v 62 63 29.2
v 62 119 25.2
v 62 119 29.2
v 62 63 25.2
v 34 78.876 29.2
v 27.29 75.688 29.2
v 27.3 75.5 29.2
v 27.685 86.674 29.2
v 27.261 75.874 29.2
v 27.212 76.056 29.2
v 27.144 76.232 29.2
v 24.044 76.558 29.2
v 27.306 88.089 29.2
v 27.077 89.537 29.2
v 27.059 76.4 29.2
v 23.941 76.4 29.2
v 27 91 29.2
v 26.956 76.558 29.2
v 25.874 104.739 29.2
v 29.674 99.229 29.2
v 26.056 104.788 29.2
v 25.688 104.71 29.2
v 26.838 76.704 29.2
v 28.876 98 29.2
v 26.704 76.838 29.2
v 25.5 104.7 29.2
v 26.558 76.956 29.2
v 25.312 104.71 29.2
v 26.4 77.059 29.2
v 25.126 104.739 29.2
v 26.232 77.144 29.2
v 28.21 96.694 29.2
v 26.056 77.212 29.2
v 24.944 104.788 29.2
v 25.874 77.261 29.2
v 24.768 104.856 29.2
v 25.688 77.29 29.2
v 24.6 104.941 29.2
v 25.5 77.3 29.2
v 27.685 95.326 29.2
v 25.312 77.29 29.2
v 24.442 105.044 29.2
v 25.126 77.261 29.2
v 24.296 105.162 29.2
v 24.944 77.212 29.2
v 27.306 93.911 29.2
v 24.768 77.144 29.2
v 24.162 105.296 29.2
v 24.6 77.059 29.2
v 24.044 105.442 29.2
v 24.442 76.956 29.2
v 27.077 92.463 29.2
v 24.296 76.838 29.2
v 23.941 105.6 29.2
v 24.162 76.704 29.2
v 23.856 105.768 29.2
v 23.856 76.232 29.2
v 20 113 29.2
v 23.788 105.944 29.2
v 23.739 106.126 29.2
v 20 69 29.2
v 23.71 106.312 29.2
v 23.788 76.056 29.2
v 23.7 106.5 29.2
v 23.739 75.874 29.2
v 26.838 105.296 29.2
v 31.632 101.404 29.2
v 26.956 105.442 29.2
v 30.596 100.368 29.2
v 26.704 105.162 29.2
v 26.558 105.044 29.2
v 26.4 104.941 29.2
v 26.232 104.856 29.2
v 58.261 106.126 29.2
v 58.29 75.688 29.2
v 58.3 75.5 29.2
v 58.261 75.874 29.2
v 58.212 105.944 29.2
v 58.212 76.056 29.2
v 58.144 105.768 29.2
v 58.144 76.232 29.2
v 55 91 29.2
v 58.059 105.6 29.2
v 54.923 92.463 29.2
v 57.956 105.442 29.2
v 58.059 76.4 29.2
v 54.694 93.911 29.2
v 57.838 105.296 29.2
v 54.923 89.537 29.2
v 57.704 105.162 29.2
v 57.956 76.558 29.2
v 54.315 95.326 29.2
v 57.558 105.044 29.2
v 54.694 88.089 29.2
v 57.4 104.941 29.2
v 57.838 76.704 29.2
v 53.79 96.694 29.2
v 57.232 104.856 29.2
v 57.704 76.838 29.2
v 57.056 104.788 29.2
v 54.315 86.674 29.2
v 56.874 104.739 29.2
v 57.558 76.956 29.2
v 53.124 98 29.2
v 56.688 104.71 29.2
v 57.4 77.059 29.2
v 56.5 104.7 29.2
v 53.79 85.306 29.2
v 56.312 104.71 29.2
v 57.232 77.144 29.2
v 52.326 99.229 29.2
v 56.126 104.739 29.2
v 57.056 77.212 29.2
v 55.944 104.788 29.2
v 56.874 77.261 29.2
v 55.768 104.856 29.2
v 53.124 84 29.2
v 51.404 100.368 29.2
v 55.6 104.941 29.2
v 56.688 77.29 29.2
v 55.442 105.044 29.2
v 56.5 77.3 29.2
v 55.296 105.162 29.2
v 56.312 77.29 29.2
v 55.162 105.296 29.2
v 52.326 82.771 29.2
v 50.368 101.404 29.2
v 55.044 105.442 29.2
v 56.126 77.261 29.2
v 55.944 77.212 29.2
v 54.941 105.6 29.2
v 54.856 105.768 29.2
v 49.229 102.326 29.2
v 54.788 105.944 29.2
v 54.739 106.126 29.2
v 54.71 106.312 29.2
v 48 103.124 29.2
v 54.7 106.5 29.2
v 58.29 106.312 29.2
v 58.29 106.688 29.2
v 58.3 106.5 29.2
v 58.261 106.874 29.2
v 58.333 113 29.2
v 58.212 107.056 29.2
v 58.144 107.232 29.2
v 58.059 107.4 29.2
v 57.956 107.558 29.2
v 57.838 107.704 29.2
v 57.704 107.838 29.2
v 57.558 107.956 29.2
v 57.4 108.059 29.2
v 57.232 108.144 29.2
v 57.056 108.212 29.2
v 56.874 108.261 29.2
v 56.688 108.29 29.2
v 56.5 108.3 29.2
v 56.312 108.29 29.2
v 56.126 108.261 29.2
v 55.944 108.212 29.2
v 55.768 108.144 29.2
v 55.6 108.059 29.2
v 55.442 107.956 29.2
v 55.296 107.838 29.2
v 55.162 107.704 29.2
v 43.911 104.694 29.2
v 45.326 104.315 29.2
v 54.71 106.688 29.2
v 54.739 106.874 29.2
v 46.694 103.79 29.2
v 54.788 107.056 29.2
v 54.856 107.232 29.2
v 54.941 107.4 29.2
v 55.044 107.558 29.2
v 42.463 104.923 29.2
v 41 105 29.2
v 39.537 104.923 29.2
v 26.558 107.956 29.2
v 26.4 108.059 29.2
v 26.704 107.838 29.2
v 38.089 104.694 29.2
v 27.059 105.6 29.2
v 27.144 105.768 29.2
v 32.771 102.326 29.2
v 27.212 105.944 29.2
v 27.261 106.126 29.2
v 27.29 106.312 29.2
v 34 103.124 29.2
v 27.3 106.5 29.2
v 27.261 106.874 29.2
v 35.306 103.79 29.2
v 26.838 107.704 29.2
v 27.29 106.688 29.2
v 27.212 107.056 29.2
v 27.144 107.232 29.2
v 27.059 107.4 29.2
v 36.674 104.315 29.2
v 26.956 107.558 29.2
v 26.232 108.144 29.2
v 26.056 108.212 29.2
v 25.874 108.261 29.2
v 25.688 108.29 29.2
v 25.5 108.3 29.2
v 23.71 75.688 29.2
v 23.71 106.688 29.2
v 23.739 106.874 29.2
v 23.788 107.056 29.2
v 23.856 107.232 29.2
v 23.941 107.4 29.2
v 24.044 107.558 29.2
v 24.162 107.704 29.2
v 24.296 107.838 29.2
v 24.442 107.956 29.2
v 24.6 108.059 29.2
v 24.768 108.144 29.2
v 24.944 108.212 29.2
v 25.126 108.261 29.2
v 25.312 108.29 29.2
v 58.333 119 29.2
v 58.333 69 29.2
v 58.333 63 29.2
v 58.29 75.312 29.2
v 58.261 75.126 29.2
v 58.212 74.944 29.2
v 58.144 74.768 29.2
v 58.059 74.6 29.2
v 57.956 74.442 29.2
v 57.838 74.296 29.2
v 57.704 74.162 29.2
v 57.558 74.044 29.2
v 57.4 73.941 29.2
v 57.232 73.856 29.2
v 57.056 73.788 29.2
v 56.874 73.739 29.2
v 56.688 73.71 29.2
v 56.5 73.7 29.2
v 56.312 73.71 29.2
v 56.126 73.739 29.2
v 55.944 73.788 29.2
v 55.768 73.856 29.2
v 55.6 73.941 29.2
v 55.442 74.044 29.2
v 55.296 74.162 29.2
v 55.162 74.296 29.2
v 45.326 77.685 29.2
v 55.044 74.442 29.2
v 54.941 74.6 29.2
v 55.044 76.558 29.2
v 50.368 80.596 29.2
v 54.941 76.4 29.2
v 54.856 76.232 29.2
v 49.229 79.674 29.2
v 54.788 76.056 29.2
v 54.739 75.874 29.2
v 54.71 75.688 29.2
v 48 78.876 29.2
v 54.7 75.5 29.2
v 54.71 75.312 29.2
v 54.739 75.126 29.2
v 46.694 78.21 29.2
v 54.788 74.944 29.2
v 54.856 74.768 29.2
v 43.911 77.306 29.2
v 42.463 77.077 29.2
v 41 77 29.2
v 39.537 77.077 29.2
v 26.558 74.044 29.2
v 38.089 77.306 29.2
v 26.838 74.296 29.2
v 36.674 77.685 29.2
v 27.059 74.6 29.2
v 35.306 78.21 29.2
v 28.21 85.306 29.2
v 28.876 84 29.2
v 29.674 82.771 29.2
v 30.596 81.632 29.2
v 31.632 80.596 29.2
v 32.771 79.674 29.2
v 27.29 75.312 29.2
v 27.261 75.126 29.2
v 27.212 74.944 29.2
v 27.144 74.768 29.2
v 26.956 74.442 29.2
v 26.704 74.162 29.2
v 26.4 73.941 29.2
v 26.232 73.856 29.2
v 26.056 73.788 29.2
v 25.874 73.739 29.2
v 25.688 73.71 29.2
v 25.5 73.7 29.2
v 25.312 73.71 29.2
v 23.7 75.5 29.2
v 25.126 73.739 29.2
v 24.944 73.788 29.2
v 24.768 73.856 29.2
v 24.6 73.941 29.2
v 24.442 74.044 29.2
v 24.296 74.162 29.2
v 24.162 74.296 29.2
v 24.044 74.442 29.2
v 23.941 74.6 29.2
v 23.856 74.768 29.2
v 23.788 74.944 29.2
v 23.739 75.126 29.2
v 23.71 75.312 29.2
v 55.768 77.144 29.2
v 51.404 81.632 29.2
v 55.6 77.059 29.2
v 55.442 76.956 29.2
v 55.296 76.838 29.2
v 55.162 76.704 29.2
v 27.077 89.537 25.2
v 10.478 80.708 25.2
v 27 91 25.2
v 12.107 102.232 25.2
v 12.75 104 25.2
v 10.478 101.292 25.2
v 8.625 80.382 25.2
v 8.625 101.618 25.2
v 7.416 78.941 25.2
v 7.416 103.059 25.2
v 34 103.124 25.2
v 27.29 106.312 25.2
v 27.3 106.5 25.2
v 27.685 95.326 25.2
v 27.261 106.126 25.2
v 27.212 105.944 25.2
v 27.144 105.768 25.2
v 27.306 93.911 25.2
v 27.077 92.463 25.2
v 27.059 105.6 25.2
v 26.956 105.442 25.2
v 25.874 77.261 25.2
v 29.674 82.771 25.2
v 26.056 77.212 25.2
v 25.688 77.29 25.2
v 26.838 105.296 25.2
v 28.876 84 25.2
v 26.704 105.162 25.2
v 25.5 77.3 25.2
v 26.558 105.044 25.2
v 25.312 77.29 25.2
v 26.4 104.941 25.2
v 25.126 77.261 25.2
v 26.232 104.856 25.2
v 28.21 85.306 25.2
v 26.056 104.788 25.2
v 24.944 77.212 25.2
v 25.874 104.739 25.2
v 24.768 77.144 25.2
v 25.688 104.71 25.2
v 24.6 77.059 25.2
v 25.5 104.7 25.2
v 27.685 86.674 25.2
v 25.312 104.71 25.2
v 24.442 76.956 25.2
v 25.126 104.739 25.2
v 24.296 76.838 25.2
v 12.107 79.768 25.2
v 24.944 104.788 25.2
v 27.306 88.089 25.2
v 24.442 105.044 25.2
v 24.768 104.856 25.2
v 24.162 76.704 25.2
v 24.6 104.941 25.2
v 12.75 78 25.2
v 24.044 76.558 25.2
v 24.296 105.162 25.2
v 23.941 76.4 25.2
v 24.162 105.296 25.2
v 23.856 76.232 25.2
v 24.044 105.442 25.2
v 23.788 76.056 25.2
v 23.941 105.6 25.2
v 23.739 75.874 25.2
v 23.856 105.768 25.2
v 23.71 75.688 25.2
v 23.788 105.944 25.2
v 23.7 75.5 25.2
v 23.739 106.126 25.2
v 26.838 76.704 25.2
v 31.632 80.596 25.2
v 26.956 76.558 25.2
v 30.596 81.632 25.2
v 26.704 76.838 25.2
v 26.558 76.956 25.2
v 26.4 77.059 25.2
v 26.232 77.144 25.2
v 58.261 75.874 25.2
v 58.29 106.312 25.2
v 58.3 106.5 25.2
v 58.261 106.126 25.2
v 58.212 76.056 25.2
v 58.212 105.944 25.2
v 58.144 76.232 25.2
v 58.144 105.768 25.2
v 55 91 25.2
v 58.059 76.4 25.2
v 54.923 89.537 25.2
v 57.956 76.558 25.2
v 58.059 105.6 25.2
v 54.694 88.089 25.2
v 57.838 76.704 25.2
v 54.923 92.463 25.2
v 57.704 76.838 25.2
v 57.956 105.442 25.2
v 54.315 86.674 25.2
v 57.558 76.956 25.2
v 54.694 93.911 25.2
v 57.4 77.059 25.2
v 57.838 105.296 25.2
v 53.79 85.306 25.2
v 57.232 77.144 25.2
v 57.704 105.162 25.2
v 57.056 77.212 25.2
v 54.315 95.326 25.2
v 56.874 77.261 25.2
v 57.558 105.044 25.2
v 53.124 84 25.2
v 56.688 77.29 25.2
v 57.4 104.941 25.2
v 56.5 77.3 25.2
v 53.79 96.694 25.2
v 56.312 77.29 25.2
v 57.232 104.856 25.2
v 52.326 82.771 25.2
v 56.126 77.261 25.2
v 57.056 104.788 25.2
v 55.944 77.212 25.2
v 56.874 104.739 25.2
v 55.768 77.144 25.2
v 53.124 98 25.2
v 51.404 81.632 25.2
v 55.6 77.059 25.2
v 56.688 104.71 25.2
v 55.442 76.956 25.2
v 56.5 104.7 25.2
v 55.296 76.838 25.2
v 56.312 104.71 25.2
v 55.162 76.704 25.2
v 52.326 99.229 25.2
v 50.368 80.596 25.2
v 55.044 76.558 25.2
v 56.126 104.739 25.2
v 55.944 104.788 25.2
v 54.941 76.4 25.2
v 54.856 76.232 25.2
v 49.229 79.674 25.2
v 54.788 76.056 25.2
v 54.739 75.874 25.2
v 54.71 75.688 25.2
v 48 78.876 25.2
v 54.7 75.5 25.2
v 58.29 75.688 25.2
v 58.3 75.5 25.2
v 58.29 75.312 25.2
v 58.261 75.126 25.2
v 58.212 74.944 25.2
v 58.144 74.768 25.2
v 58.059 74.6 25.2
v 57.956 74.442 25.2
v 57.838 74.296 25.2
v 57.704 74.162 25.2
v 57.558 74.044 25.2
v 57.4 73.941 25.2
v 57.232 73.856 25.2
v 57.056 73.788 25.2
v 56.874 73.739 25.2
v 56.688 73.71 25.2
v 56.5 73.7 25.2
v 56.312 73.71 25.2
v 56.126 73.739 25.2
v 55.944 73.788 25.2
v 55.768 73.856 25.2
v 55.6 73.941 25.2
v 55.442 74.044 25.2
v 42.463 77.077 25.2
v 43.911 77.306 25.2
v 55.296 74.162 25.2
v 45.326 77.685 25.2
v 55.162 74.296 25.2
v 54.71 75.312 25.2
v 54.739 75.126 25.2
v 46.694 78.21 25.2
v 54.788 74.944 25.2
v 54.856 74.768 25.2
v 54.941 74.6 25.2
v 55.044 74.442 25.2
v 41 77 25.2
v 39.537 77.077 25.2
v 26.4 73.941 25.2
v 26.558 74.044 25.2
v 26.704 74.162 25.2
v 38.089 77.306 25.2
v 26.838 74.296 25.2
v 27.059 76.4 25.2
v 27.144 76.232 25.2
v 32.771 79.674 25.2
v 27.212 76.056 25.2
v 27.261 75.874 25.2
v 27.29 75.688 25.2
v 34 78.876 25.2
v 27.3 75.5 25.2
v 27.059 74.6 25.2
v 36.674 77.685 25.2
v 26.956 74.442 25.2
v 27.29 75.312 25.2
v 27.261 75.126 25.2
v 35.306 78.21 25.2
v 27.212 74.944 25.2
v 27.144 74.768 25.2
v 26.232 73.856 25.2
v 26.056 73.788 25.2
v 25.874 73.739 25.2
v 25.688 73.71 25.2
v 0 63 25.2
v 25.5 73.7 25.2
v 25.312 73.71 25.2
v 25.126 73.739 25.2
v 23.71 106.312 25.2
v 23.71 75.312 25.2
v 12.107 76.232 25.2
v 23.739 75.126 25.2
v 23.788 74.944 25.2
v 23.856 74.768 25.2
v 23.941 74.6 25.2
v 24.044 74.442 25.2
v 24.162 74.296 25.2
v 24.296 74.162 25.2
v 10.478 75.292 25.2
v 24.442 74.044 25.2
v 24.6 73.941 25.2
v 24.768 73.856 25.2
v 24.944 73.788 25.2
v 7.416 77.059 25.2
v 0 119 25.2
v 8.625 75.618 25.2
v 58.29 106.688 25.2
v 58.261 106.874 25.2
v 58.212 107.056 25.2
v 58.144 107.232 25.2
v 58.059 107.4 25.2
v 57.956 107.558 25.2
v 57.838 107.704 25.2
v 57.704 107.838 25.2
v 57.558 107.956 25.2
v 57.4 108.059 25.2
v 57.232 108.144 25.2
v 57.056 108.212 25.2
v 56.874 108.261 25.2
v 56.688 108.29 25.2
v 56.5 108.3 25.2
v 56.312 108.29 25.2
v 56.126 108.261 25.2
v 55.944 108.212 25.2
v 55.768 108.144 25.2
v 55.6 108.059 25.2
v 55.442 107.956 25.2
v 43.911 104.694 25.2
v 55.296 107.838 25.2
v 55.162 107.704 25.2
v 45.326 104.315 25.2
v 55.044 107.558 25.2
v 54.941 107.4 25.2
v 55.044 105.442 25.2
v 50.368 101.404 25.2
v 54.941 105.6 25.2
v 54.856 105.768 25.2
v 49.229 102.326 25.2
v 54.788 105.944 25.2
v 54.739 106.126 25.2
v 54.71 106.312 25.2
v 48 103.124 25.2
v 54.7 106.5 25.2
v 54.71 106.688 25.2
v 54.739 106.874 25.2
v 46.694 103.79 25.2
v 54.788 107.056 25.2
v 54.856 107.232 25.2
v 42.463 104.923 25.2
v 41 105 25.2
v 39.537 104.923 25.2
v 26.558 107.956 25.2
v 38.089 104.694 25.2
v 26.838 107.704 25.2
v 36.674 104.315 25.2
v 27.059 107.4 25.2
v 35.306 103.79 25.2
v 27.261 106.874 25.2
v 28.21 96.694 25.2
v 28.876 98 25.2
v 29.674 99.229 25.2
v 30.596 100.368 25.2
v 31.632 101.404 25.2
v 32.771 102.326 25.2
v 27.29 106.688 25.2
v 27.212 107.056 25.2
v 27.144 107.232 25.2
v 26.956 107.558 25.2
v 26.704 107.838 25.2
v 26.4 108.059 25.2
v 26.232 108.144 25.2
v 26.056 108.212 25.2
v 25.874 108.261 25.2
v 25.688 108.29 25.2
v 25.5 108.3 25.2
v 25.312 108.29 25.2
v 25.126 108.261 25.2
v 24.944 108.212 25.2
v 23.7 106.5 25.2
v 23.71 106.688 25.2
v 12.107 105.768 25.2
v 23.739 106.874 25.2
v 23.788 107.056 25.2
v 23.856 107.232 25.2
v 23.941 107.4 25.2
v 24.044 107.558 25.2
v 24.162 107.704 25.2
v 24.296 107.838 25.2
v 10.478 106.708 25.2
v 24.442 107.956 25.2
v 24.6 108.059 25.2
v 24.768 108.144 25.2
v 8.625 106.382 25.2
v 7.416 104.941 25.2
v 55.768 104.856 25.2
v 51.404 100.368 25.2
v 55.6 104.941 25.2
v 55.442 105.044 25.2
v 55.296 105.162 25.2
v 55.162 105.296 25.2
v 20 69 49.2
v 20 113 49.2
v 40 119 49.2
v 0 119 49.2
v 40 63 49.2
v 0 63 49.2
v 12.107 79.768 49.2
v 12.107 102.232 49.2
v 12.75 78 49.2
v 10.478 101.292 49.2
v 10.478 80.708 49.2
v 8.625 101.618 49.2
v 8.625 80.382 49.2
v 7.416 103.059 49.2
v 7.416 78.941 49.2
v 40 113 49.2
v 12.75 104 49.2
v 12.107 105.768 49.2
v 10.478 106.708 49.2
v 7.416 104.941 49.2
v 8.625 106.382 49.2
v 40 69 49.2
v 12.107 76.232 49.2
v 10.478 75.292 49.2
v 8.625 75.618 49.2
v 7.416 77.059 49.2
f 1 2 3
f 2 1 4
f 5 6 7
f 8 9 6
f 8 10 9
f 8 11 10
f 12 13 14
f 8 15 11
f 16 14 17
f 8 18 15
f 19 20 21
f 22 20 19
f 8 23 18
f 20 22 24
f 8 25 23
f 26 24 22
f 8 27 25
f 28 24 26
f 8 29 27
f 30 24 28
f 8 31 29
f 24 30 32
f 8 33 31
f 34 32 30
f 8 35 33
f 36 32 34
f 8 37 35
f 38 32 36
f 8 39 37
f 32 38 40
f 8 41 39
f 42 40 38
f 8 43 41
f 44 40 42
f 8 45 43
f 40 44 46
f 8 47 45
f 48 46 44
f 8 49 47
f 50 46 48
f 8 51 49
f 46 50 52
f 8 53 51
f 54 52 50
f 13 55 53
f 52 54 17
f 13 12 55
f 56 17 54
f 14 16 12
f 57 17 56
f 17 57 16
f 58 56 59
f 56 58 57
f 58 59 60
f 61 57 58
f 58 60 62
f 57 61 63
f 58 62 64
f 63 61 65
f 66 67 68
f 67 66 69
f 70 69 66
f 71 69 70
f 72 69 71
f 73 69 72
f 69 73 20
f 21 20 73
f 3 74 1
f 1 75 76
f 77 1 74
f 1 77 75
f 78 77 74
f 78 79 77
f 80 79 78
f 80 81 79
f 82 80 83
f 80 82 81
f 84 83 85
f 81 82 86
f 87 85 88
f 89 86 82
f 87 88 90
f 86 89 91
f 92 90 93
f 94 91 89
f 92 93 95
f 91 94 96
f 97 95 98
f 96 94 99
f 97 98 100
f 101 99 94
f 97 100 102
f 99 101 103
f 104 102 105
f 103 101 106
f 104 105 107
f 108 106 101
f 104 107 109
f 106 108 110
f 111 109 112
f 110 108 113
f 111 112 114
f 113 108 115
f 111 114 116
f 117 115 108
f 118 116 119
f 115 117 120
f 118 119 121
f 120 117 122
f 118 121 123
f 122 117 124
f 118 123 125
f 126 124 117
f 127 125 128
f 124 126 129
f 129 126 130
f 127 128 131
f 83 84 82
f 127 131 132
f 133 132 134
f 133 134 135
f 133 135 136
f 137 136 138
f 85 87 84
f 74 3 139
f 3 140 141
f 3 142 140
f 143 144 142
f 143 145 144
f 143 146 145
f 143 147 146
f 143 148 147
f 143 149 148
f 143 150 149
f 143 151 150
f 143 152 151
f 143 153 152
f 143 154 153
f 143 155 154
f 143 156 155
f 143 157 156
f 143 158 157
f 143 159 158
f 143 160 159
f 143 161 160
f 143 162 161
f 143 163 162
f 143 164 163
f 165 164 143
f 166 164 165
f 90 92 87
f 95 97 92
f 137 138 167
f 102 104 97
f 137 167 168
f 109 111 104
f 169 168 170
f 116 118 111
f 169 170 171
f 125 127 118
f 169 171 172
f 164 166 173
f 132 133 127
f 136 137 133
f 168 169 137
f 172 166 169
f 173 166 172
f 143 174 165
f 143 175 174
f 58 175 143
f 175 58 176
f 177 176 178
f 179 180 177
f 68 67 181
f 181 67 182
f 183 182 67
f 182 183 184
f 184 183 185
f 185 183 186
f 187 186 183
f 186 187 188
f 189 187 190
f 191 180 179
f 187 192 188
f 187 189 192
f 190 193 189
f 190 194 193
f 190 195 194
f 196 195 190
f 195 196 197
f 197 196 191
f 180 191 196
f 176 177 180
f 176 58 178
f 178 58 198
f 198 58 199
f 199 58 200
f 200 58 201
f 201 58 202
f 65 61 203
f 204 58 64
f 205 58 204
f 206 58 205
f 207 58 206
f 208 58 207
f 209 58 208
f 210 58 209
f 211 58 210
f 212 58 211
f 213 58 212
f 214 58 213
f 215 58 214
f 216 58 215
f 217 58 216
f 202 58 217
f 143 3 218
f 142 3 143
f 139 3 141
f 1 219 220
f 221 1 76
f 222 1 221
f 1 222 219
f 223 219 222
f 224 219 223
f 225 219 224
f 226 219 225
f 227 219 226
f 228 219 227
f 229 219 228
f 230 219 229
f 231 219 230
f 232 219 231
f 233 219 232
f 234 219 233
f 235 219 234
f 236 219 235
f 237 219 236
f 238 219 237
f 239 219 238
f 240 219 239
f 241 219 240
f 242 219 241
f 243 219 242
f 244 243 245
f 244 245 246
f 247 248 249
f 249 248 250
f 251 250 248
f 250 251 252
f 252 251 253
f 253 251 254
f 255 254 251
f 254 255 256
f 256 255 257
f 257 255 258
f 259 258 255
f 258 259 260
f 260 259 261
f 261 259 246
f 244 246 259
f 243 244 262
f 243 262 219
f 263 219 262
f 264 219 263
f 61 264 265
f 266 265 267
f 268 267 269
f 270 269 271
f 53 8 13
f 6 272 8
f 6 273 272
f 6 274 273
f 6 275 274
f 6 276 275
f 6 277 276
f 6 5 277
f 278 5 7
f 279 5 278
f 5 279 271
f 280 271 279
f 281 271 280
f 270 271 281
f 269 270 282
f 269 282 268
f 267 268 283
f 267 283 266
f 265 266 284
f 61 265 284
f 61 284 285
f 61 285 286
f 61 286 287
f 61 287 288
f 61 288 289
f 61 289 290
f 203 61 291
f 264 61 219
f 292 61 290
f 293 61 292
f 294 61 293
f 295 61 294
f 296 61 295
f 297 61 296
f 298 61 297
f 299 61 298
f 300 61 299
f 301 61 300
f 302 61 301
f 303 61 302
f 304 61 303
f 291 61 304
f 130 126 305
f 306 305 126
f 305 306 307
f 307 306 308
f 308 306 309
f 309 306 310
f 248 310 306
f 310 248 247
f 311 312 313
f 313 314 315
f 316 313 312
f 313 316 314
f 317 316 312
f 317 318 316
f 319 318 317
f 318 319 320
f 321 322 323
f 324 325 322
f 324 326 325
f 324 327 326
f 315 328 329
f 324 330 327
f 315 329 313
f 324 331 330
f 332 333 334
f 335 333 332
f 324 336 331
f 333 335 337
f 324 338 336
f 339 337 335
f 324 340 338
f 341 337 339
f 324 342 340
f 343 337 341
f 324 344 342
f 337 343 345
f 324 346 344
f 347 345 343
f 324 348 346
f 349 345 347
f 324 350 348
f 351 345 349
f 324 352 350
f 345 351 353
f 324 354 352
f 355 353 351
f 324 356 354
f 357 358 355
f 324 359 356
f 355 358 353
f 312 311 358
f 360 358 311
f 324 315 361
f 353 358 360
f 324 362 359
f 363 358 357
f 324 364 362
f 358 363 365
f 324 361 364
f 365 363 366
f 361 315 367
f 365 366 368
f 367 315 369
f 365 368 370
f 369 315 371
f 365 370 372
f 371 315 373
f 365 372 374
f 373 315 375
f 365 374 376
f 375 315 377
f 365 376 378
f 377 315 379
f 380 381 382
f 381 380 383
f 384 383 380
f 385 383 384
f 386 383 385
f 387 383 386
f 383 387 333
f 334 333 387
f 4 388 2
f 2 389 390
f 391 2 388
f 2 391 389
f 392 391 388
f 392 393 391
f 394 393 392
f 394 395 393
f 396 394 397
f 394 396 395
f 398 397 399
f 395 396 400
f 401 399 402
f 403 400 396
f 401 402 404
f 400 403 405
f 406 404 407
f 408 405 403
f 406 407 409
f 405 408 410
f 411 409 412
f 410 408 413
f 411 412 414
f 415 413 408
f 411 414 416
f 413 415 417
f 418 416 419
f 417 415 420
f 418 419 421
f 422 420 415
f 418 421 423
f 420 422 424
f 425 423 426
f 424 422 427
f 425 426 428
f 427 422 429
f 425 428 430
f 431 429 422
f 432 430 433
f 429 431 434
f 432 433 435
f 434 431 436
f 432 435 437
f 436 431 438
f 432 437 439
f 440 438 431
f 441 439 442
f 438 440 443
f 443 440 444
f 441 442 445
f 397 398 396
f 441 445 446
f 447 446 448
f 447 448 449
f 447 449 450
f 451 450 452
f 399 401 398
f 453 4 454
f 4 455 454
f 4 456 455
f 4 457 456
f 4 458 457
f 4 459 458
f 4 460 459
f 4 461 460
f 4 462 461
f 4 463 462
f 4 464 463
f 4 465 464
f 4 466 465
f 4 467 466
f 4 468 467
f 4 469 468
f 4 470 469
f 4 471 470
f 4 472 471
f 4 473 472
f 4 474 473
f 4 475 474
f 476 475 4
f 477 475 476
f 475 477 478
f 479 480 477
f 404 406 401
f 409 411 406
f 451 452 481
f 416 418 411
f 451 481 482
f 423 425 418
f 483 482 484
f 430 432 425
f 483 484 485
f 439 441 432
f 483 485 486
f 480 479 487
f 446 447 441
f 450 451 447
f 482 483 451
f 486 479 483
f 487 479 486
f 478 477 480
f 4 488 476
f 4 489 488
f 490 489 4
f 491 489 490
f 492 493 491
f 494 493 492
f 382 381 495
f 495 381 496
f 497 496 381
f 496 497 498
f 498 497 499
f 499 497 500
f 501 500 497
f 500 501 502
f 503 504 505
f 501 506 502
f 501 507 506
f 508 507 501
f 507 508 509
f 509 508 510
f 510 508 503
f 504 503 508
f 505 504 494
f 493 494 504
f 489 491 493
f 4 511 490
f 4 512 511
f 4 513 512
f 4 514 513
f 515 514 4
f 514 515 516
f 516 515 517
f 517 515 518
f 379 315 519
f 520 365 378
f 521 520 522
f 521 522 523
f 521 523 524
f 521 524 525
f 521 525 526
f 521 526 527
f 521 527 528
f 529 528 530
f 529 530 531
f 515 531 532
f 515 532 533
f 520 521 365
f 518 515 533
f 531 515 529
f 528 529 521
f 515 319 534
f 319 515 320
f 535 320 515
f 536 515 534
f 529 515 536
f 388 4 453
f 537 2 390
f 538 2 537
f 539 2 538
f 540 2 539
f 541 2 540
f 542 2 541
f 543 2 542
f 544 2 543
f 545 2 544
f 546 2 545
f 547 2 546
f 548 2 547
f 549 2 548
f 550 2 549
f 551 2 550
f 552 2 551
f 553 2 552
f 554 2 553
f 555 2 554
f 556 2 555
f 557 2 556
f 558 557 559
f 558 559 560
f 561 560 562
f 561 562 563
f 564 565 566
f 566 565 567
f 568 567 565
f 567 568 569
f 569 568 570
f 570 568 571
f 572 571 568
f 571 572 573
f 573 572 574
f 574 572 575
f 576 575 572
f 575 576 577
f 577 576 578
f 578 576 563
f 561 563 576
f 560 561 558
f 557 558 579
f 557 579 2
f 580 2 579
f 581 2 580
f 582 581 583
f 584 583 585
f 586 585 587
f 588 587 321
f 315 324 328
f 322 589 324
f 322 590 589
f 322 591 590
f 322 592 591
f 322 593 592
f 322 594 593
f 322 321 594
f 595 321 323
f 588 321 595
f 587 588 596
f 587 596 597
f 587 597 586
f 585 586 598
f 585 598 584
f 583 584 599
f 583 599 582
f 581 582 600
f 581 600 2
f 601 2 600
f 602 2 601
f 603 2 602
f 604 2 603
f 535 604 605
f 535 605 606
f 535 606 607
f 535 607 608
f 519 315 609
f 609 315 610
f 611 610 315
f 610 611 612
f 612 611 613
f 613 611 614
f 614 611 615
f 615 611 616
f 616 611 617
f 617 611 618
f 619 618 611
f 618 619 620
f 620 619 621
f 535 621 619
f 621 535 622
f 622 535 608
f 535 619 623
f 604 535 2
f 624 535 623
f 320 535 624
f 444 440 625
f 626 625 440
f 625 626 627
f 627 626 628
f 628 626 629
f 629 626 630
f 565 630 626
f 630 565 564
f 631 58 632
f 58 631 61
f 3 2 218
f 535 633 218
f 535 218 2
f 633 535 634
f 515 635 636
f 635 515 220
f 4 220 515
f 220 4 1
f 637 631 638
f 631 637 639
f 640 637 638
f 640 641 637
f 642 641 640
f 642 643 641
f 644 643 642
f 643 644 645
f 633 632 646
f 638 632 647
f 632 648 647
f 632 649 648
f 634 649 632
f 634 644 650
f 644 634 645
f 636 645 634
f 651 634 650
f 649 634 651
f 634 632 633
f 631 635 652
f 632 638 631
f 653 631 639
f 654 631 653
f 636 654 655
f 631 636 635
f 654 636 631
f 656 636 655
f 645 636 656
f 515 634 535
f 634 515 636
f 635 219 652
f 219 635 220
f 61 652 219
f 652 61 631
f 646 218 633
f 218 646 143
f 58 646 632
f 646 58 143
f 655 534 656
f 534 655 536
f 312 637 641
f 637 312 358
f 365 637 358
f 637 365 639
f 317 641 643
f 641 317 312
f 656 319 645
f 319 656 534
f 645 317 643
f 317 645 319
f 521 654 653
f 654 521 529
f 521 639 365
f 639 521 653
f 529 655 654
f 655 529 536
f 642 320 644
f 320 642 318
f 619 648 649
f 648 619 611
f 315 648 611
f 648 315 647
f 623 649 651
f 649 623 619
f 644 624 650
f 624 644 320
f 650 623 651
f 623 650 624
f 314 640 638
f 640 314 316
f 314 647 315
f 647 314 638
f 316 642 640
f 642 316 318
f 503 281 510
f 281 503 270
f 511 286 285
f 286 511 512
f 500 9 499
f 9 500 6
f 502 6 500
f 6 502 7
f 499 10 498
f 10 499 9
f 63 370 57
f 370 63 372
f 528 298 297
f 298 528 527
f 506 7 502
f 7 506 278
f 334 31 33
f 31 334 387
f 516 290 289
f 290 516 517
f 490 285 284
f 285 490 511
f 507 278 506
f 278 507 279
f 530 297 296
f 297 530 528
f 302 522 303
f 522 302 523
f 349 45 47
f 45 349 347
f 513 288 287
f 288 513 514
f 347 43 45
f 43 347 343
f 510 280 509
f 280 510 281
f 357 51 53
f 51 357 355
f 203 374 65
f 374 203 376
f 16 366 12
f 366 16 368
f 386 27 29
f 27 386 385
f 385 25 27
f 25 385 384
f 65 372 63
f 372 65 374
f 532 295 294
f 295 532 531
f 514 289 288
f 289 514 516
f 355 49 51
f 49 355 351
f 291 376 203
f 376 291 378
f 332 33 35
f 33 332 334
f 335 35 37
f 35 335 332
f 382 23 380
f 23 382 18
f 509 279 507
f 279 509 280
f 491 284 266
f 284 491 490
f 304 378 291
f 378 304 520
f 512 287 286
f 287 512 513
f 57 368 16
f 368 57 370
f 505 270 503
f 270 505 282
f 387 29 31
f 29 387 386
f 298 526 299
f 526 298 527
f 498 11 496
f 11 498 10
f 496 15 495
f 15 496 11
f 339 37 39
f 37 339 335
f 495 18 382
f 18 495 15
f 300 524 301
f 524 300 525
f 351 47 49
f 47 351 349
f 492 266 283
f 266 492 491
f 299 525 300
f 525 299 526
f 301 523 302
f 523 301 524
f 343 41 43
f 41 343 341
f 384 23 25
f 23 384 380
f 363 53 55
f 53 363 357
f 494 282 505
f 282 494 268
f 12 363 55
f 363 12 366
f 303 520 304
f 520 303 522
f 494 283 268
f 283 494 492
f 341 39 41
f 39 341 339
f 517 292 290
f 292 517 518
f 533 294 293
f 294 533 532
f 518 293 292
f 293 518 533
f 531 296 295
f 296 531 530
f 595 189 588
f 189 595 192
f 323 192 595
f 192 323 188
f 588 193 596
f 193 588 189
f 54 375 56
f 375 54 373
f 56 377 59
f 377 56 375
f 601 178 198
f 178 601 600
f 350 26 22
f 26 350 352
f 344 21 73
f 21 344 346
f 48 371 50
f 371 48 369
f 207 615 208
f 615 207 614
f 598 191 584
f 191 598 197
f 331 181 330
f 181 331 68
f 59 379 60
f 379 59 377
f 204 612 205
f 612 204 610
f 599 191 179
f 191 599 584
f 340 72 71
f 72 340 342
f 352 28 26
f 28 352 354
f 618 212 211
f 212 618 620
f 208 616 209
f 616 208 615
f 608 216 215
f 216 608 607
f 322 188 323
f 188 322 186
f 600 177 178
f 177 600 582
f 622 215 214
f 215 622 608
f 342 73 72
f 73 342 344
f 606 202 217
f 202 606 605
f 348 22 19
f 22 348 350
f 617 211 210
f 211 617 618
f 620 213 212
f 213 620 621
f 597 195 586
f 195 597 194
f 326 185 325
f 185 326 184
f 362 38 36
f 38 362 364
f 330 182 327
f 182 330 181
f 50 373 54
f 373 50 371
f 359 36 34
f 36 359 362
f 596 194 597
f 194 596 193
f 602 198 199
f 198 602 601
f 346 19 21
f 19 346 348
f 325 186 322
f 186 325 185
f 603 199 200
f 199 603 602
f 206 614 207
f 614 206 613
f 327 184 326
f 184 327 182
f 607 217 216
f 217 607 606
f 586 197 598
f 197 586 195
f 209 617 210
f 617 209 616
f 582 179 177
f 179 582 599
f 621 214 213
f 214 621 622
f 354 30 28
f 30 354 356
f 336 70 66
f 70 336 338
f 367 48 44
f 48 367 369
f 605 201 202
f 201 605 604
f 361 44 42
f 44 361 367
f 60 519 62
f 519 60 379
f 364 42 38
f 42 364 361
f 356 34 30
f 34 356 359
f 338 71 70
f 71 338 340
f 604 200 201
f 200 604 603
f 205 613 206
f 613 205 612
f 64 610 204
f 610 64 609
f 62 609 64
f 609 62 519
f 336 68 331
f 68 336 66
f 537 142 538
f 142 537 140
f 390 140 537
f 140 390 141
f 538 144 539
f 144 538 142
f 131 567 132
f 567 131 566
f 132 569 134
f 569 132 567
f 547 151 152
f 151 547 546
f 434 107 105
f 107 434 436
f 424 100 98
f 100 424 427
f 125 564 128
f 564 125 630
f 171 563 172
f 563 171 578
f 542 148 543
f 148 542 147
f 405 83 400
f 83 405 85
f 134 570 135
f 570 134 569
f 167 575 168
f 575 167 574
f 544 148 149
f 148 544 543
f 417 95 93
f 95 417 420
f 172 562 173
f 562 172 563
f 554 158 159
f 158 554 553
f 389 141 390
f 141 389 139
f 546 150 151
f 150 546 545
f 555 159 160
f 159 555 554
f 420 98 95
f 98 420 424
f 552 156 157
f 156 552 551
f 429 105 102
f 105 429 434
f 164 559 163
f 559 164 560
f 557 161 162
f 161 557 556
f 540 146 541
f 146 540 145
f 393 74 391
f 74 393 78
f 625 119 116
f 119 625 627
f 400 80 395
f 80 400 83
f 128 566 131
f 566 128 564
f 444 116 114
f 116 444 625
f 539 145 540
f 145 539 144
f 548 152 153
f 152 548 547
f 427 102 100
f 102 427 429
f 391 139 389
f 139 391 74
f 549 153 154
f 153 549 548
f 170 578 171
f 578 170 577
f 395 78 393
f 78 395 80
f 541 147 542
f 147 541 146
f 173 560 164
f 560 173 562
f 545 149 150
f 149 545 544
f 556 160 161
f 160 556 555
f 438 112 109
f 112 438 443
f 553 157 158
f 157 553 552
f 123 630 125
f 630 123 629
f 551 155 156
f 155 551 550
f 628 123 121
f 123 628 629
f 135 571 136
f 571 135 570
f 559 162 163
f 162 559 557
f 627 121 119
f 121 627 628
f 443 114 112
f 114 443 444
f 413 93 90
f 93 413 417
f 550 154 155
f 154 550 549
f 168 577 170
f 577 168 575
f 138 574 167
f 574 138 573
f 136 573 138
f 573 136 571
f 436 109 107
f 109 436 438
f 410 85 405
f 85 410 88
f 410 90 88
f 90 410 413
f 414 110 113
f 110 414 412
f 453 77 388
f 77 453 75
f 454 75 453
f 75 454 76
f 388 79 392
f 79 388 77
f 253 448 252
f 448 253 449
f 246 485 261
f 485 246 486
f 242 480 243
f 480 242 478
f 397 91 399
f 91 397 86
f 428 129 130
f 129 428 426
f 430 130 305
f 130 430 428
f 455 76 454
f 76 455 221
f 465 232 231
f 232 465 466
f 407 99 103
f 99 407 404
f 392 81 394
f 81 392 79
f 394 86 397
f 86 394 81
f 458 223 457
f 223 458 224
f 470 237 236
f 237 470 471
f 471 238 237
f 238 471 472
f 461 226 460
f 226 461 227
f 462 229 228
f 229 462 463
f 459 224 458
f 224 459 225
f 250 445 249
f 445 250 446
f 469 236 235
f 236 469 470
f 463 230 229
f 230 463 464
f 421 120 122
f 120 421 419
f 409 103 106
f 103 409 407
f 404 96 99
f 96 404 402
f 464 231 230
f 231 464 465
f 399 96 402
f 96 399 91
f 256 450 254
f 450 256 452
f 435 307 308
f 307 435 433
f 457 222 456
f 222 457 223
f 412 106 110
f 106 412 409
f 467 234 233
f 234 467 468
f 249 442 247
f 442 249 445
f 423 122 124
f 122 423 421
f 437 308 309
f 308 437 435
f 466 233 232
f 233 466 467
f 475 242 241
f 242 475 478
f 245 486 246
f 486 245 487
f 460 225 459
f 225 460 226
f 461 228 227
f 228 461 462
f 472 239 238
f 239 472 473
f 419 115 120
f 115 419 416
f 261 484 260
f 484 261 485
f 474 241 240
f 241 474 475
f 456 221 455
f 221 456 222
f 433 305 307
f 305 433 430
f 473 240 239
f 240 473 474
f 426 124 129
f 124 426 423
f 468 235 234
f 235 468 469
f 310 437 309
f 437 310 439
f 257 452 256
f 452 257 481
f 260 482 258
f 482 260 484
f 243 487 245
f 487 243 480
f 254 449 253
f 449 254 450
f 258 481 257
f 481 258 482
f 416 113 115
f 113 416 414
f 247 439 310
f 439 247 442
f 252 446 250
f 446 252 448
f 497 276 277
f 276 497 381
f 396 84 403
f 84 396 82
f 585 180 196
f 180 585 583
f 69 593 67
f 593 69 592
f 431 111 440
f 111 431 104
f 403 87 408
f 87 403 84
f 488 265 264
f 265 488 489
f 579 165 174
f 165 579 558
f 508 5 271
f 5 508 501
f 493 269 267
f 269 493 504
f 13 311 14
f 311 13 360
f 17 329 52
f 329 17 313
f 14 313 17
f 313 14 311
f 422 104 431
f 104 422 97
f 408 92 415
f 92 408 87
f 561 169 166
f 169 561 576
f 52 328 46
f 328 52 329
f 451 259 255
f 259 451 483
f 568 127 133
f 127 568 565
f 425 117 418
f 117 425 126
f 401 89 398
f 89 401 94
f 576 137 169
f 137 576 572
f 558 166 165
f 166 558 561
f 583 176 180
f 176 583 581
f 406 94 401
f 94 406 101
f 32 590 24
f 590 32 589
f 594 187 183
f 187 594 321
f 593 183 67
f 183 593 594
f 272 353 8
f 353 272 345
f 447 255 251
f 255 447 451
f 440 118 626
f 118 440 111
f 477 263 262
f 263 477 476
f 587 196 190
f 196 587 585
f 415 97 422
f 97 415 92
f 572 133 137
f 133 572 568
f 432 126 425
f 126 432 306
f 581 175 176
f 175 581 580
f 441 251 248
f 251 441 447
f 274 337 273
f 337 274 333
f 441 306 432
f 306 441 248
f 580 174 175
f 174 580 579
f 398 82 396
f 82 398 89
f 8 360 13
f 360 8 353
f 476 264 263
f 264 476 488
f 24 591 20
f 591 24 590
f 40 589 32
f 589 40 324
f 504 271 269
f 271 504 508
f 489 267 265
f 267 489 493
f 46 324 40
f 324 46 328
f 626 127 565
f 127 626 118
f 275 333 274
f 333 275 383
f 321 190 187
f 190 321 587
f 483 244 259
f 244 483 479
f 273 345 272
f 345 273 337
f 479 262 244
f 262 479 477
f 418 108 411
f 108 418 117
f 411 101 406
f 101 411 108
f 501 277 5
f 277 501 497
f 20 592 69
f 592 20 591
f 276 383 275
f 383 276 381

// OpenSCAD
// file: ../library.scad
//rounded cube Functions from: http://www.thingiverse.com/thing:38069


module cube_fillet(size,radius=-1,vertical,top,bottom,center=false,$fn=0){
    if (center) {
        cube_fillet_inside(size, radius, vertical, top, bottom, $fn=$fn);
    } else {
        translate([size[0]/2, size[1]/2, size[2]/2])
            cube_fillet_inside(size, radius, vertical, top, bottom, $fn=$fn);
    }
}
module fillet(radius, height=100, $fn=60) {  
    //this creates negative of fillet,
    //i.e. thing to be substracted from object
    translate([-radius, -radius, -height/2-0.01])
        difference() {
            cube([radius*2, radius*2, height+0.02]);
            cylinder(r=radius, h=height+0.02, $fn=$fn);
        }
}

module cube_negative_fillet(size,radius=-1,vertical, top,bottom,$fn=0){
    j=[1,0,1,0];

    for (i=[0:3]) {
        if (radius > -1) {
            rotate([0, 0, 90*i])
                translate([size[1-j[i]]/2, size[j[i]]/2, 0])
                    fillet(radius, size[2], $fn=$fn);
        } else {
            rotate([0, 0, 90*i])
                translate([size[1-j[i]]/2, size[j[i]]/2, 0])
                    fillet(vertical[i], size[2], $fn=$fn);

        }
        rotate([90*i, -90, 0])
            translate([size[2]/2, size[j[i]]/2, 0 ])
                fillet(top[i], size[1-j[i]], $fn=$fn);
        rotate([90*(4-i), 90, 0])
            translate([size[2]/2, size[j[i]]/2, 0])
                fillet(bottom[i], size[1-j[i]], $fn=$fn);
    }
}

module cube_fillet_inside(size,radius=-1,vertical,top,bottom,$fn=0){

    if (radius == 0) {
        cube(size, center=true);
    } else {
        difference() {
            cube(size, center=true);
            cube_negative_fillet(size, radius, vertical, top, bottom, $fn=$fn);
        }
    }
}
// file: y_idler_ends.scad
// y_idler ends 
// Author: sdavi


//Idler Ends BoM
//16x M5x8mm bolt
//4x M4x??m Bolt + nut
//8x M4 washer
//8x F624ZZ bearing

include <../configuration.scad>
include <../dimensions.scad>

//use <y_motor_end.scad>




im_using_hidden_corner_connectors = 1; // if using hidden corner connectors
hcc=[9,22,1]; //to avoid hidden corner connectors;

//add extra lenths if using hidden corner conenctors
extra_l=max(t_nut_length+im_using_hidden_corner_connectors*(hcc[1]), t_nut_length*2); 
extra_w = max(40, im_using_hidden_corner_connectors*(hcc[1])+t_nut_length);

y_block_length = 20+extra_l;//big enough to hold 2 frame screws
y_block_width = 20+extra_w; 
y_block_height = 4;

y_block_total_height = 4+4+min_beltbearing_height;


echo("block length:", y_block_length);
echo("block width:", y_block_width);
echo("block height:", y_block_height);

echo("Total Height:", y_block_height*2+min_beltbearing_height);





//y_idler_ends_print();
//%motor_mount();
//y_motor_end_idler();

//%illustration();
//support();



module y_idler_ends_print(){
	difference(){
		//bottom
		y_motor_end_idler();
		translate([0,0,y_block_total_height-9.9])cube([y_block_width, y_block_length, 10]);
	
	}
	
	translate([0,-5,y_block_total_height])rotate([180,0,0])intersection(){
		y_motor_end_idler();
		translate([0,0,y_block_total_height-9.9])cube([y_block_width, y_block_length, 10]);
	
	}
}













//calculate positions for bearings

inner_bearing_pos = [	nema17_width/2+20+GT2_pulley_geared_diameter/2+(GT2_belt_thickness-GT2_belt_tooth_height)+belt_bearing[2]/2, 
						y_bearing_block_width/2+xy_bearing_distance,
						0];

outer_bearing_pos = [	inner_bearing_pos[0]-belt_bearing[2]-GT2_belt_thickness-6, 
							inner_bearing_pos[1]-5, 
							0 ];







module y_motor_end_idler(){
	difference(){
		cube([y_block_width, y_block_length,y_block_total_height]);

		//remove for frame corner
		translate([-0.1, -0.1, -0.1])cube([20.1, 20.1, y_block_total_height+0.2]);
		//remove frame lengths
		translate([0,-0.1,y_block_total_height/2-20/2]) cube([y_block_width+0.1, 20.2, 20]);
		translate([-0.1,-0.1,y_block_total_height/2-20/2]) cube([20.2, y_block_length+0.2, 20]);
		
		//belt area

		translate([20,20,y_block_total_height/2-min_beltbearing_height/2]) 
			cube([y_block_width-20+0.1, y_block_length-20+0.1, min_beltbearing_height]);


		bearing_holes();

		//frame screws

		if(im_using_hidden_corner_connectors==0){
			translate([10,20+t_nut_length/2,-0.1]) 
				cylinder(d=frame_screw, h=y_block_total_height+0.2);
			translate([10,20+t_nut_length+t_nut_length/2,-0.1]) 
				cylinder(d=frame_screw, h=y_block_total_height+0.2);
		
			translate([20+t_nut_length/2+3,10,-0.1]) 
				cylinder(d=frame_screw, h=y_block_total_height+0.2);
			translate([20+t_nut_length+t_nut_length/2+6,10,-0.1]) 
				cylinder(d=frame_screw, h=y_block_total_height+0.2);

		} else {
			//hidden corner connectors get in the way, avoid them
//hcc=[9,22,1]; //to avoid hidden connectors;

			//top, has hidden conenctors
			translate([10,y_block_length-t_nut_length/2,y_block_total_height/2]) 
				cylinder(d=frame_screw, h=y_block_total_height/2+0.1);
			translate([y_block_width-t_nut_length/2,10,y_block_total_height/2]) 
				cylinder(d=frame_screw, h=y_block_total_height/2+0.1);

			//make cutout for hidden connector so sits flush
			translate([20-0.1, 20/2-hcc[0]/2, y_block_total_height/2+20/2-0.1])
				cube([hcc[1]+0.1, hcc[0], hcc[2]+0.1]);
			translate([20/2-hcc[0]/2, 20-0.1, y_block_total_height/2+20/2-0.1])
				cube([hcc[0], hcc[1]+0.1, hcc[2]+0.1]);


			//bottom
			translate([10,20+t_nut_length/2,-0.1]) 
				cylinder(d=frame_screw, h=y_block_total_height/2);
			translate([10,20+t_nut_length+t_nut_length/2,-0.1]) 
				cylinder(d=frame_screw, h=y_block_total_height/2);
		
			translate([20+t_nut_length/2+3,10,-0.1]) 
				cylinder(d=frame_screw, h=y_block_total_height/2);
			translate([20+t_nut_length+t_nut_length/2+6,10,-0.1]) 
				cylinder(d=frame_screw, h=y_block_total_height/2);

			
		}



	}
}


module bearing_holes(){
	//belt bearing holes

	//bearing inner
	translate(inner_bearing_pos)  translate([0,0,-0.1])cylinder(d=belt_bearing[0]+0.2, h=y_block_total_height+0.2, $fn=60);
	//bearing outer
	translate(outer_bearing_pos) translate([0,0,-0.1])  cylinder(d=belt_bearing[0]+0.2, h=y_block_total_height+0.2, $fn=60);
	//bearing outer padding space
	translate(outer_bearing_pos) translate([0,0,y_block_height]) cylinder(d=belt_bearing[1]*1.8, h=min_beltbearing_height, $fn=30);

	
	

}

module illustration(){
		visualise_high = 0; //high (1) or low bearing (0)

//frames
			%color("grey")translate([0,0,-20]) 
				cube([20,20,70]);
			%color("grey")%translate([0,0,y_block_total_height/2-10]) cube([100, 20,20]);
			%color("grey")%translate([0,0,y_block_total_height/2-10]) cube([20,150, 20]);

//bearings
	
		%color("green")translate(inner_bearing_pos)
			translate([0,0,y_block_total_height/2-10+m4_washer_thickness]){ 
				if( visualise_high == 0){
					cylinder(d=belt_bearing[1], h=belt_bearing[2], $fn=60); //bottom
				} else {

					translate([0,0,belt_bearing[2]+m4_washer_thickness*2])
						cylinder(d=belt_bearing[1], h=belt_bearing[2], $fn=60); //top
				}
			}

		%color("green")translate(outer_bearing_pos)
			translate([0,0,y_block_total_height/2-10+m4_washer_thickness]) {
					
				if(visualise_high == 0){
					cylinder(d=belt_bearing[1], h=belt_bearing[2], $fn=60);//bottom	

				} else {
					translate([0,0,belt_bearing[2]+m4_washer_thickness*2])
						cylinder(d=belt_bearing[1], h=belt_bearing[2], $fn=60); //top				
				}

			}

//nema17
		%color("yellow") rotate([0,180,0])
			translate([	-nema17_width/2-20,
							nema17_width/2+20+50,
							-(min_beltbearing_height+y_block_height*2)-46]) 
			nema17();	
			
		%translate([nema17_width/2+20,nema17_width/2+20+50,y_block_height+m4_washer_thickness+belt_bearing[2]/2 + visualise_high*(belt_bearing[2]+m4_washer_thickness*2)])
			pulley(bottom=visualise_high);

//belts
		%color("DimGray") translate(inner_bearing_pos) 
			translate([-belt_bearing[2]/2-GT2_belt_thickness,0,y_block_height+m4_washer_thickness+belt_bearing[2]/2-GT2_belt_width/2 +visualise_high*(belt_bearing[2]+m4_washer_thickness*2)]) cube([GT2_belt_thickness, 50, GT2_belt_width]);
		

	//rod holder 
	//%color("red")translate([20,0,y_block_height*2+min_beltbearing_height+frame_spacer_height])mirror([0,0,1])y_rod_holder();

}



//modle of nema17 for illustration
module nema17(){


	union(){
		translate([-nema17_width/2, -nema17_width/2, 0])
			cube_fillet([nema17_width, nema17_width, nema17_height], vertical=[3,3,3,3]);
		translate([0,0,48]) {
			cylinder(d=22, h=2, $fn=60); //rasied center bit
			cylinder(d=5, h=22+2, $fn=60); //shaft
		}

		

	
	}
	


}


//pulley bottom = 1 or 0
module pulley(bottom = 1){
		//pulley GT2 20 tooth
		//pulley height = 16, diameter = 16, bottom=1mm, top=7+0.5;


		rotate([0,bottom*180,0])translate([0,0,-1-(16-7.5-1)/2]){
			color("orange")  cylinder(d=16, h=1, $fn=60);
			color("orange") translate([0,0,16-7.5]) cylinder(d=16, h=7.5, $fn=60);	
			color("yellow") translate([0,0,1]) cylinder(d=12.2, h=16-1-7.5, $fn=60);
		}
}
// file: ../dimensions.scad
// Dimensions
// Author: sdavi


LM8UU = [8, 15, 24];//rod diameter,outter diameter, length
LM12UU = [12, 21, 30];
LM12LUU = [12, 21, 57];
LM12UUx2 = [LM12UU[0], LM12UU[1], LM12UU[2]*2];

BEARING_624 = [4,13,5]; //inner diameter(hole), outter diameter, thickness (http://reprap.org/wiki/Ball_bearing)
BEARING_2x624 = [4, 13, 10]; // 2 624 bearings together, good size for GT2

BEARING_6300 = [10,35,11]; //inner diameter, outer diameter, thickness

vslot_wheel = [23.89,10.23];	//23.89 & 10.23
vslot_wheel_hole = 5+0.5;
vslot_wheel_eccentric = 7.2+0.5; //hole for eccentric spacer
vslot_wheel_spacer_length = 6.35;


t_nut_length = 15+1; //hole in center 1mm cleanance incase hole isnt actually center




GT2_belt_width = 6;
GT2_belt_pitch = 2;
GT2_belt_thickness = 1.38;
GT2_belt_tooth_height = 0.75;  
GT2_belt_tooth_ratio = 0.5;



GT2_pulley_geared_diameter=12.2;//measured from top of tooth to top of tooth opp side// 12.2 is for the 20 tooth pulley

//from metric (prusa i3)
m4_diameter = 4.6;
m4_nut_diameter = 7.6;
m4_nut_diameter_horizontal = 8.15;

m3_diameter = 3.6;
m3_nut_diameter = 5.3;
m3_nut_diameter_horizontal = 6.8;
m3_washer_diameter = 6.9;
//end i3 variables

m5_diameter = 5.5;

//Hex Head M3x30: Head 5.5mm flat to flat, 2.12mm thick
m3_hex_head_diameter = 5.5*2/sqrt(3) + 0.2;

M4 = m4_diameter;
M3 = m3_diameter;
M5 = m5_diameter;
m4_washer_thickness = 0.8; //flat and penny washers
m4_washer_diameter = 9.6;

nema17_holes = 31;// mm between screws
nema17_width = 42; //width
nema17_height = 48;
// file: ../configuration.scad
// Configuration
// Author: sdavi


include <dimensions.scad>
use <library.scad>


x_rod_distance = 45;

y_bearing = LM8UU;
x_bearing = LM8UU;
//z_bearing = LM12UUx2;
z_bearing = LM12LUU;
belt_bearing = BEARING_2x624;


end_belt_bearing_distance = 25;// distance between 2 bearings on y-ends
belt_clearance = 9.5; //space for belts
x_belt_clearance = 5; //spacing between x-axis vslot and belt

frame_screw = M5; //m5 screws for v/tslot

// calculated vars


//y bearing block
y_bearing_block_length = 2*y_bearing[2] + M3*2 + 5;
//y_bearing_block_width = y_bearing[1]+5;
y_bearing_block_width = 20; //vslot frame width

y_bearing_block_height = 6+y_bearing[1]/2;

//xy_bearing_distance = y_bearing_block_width/2+belt_clearance+belt_bearing[1]/2; //distance between center of y-bearing to center of x-belt bearing 
xy_bearing_distance = vslot_wheel[1]/2+vslot_wheel_spacer_length+belt_clearance+belt_bearing[1]/2; //distance between center of v_slot to center of x-belt bearing 




//min height for belt bearings
min_beltbearing_height = max(((belt_bearing[2]+m4_washer_thickness*2) * 2), y_bearing_block_height);
// main file
// y_motor end
// Author: sdavi


//Motor Mount BoM
// M3 bolts
// 2x M5x?? bolts
// 1x NEMA17



include <../configuration.scad>
include <../dimensions.scad>
include <y_idler_ends.scad>


nema_mount_width = nema17_holes+11;
motor_mount_thickness = 4;



motor_mount();
%illustration();


module motor_mount(){

	nema_mount_thickness = 4;

	difference(){
		union(){
			translate([20,20+50-7,min_beltbearing_height+motor_mount_thickness*2-2-nema_mount_thickness]){
				cube([nema17_width, nema17_width+14,nema_mount_thickness]);
				translate([-20,0,0]) cube([20, nema17_width+14, 20+nema_mount_thickness]);
				support();
				translate([0,7+nema17_width+1,0]) support();
			}
		} // end union

		translate([20,20+50-7,min_beltbearing_height+motor_mount_thickness*2-2-nema_mount_thickness-0.1]){
				
			//frame screws (bottom)
			translate([-10,15,0])cylinder(d=frame_screw, h=20+nema_mount_thickness+0.2);				
			translate([-10,7+nema17_width+7-15,0])cylinder(d=frame_screw, h=20+nema_mount_thickness+0.2);	
		} // end translate
		

		translate([20+nema17_width/2,20+50+nema17_width/2,min_beltbearing_height+motor_mount_thickness*2-2-nema_mount_thickness-0.1]){
			cylinder(d=28, h=4.2, $fn=60); //central nema hole
	
			//nema holes.
			for(holes=[[-nema17_holes/2, -nema17_holes/2],
						 [-nema17_holes/2, nema17_holes/2],
						 [nema17_holes/2, nema17_holes/2], 
						 [nema17_holes/2, -nema17_holes/2]]){
				translate([holes[0], holes[1], 0])
					cylinder(d=M3, h=nema_mount_thickness+0.2, $fn=60);
			}// end for loop
		}// end translate
	} // end difference
}
	

module support(height=6, width=nema17_width){

	translate([0,height, 0])rotate([90,0,0])linear_extrude(height=height, slices = 20)
			polygon( points=[[0,0],
				[width,0],
              [20,20+motor_mount_thickness],
				[0,20+motor_mount_thickness], [0,0]] 
			);						


}




module illustration(){
		visualise_high = 0; //high (1) or low bearing (0)

//frames
			%color("grey")translate([0,0,-20]) cube([20,20,70]);
			%color("grey")%translate([0,0,y_block_total_height/2-10]) cube([100, 20,20]);
			%color("grey")%translate([0,0,y_block_total_height/2-10]) cube([20,150, 20]);

//nema17
		%color("yellow") rotate([0,180,0])
			translate([	-nema17_width/2-20,
							nema17_width/2+20+50,
							-(min_beltbearing_height+motor_mount_thickness*2)-46]) 
			nema17();	
			
		%translate([nema17_width/2+20,nema17_width/2+20+50,y_block_height+m4_washer_thickness+belt_bearing[2]/2 + visualise_high*(belt_bearing[2]+m4_washer_thickness*2)])
			pulley(bottom=visualise_high);

}



//modle of nema17 for illustration
module nema17(){
	union(){
		translate([-nema17_width/2, -nema17_width/2, 0])
			cube_fillet([nema17_width, nema17_width, nema17_height], vertical=[3,3,3,3]);
		translate([0,0,48]) {
			cylinder(d=22, h=2, $fn=60); //rasied center bit
			cylinder(d=5, h=22+2, $fn=60); //shaft
		}
	}
}


//pulley bottom = 1 or 0
module pulley(bottom = 1){
		//pulley GT2 20 tooth
		//pulley height = 16, diameter = 16, bottom=1mm, top=7+0.5;


		rotate([0,bottom*180,0])translate([0,0,-1-(16-7.5-1)/2]){
			color("orange")  cylinder(d=16, h=1, $fn=60);
			color("orange") translate([0,0,16-7.5]) cylinder(d=16, h=7.5, $fn=60);	
			color("yellow") translate([0,0,1]) cylinder(d=12.2, h=16-1-7.5, $fn=60);
		}
}
